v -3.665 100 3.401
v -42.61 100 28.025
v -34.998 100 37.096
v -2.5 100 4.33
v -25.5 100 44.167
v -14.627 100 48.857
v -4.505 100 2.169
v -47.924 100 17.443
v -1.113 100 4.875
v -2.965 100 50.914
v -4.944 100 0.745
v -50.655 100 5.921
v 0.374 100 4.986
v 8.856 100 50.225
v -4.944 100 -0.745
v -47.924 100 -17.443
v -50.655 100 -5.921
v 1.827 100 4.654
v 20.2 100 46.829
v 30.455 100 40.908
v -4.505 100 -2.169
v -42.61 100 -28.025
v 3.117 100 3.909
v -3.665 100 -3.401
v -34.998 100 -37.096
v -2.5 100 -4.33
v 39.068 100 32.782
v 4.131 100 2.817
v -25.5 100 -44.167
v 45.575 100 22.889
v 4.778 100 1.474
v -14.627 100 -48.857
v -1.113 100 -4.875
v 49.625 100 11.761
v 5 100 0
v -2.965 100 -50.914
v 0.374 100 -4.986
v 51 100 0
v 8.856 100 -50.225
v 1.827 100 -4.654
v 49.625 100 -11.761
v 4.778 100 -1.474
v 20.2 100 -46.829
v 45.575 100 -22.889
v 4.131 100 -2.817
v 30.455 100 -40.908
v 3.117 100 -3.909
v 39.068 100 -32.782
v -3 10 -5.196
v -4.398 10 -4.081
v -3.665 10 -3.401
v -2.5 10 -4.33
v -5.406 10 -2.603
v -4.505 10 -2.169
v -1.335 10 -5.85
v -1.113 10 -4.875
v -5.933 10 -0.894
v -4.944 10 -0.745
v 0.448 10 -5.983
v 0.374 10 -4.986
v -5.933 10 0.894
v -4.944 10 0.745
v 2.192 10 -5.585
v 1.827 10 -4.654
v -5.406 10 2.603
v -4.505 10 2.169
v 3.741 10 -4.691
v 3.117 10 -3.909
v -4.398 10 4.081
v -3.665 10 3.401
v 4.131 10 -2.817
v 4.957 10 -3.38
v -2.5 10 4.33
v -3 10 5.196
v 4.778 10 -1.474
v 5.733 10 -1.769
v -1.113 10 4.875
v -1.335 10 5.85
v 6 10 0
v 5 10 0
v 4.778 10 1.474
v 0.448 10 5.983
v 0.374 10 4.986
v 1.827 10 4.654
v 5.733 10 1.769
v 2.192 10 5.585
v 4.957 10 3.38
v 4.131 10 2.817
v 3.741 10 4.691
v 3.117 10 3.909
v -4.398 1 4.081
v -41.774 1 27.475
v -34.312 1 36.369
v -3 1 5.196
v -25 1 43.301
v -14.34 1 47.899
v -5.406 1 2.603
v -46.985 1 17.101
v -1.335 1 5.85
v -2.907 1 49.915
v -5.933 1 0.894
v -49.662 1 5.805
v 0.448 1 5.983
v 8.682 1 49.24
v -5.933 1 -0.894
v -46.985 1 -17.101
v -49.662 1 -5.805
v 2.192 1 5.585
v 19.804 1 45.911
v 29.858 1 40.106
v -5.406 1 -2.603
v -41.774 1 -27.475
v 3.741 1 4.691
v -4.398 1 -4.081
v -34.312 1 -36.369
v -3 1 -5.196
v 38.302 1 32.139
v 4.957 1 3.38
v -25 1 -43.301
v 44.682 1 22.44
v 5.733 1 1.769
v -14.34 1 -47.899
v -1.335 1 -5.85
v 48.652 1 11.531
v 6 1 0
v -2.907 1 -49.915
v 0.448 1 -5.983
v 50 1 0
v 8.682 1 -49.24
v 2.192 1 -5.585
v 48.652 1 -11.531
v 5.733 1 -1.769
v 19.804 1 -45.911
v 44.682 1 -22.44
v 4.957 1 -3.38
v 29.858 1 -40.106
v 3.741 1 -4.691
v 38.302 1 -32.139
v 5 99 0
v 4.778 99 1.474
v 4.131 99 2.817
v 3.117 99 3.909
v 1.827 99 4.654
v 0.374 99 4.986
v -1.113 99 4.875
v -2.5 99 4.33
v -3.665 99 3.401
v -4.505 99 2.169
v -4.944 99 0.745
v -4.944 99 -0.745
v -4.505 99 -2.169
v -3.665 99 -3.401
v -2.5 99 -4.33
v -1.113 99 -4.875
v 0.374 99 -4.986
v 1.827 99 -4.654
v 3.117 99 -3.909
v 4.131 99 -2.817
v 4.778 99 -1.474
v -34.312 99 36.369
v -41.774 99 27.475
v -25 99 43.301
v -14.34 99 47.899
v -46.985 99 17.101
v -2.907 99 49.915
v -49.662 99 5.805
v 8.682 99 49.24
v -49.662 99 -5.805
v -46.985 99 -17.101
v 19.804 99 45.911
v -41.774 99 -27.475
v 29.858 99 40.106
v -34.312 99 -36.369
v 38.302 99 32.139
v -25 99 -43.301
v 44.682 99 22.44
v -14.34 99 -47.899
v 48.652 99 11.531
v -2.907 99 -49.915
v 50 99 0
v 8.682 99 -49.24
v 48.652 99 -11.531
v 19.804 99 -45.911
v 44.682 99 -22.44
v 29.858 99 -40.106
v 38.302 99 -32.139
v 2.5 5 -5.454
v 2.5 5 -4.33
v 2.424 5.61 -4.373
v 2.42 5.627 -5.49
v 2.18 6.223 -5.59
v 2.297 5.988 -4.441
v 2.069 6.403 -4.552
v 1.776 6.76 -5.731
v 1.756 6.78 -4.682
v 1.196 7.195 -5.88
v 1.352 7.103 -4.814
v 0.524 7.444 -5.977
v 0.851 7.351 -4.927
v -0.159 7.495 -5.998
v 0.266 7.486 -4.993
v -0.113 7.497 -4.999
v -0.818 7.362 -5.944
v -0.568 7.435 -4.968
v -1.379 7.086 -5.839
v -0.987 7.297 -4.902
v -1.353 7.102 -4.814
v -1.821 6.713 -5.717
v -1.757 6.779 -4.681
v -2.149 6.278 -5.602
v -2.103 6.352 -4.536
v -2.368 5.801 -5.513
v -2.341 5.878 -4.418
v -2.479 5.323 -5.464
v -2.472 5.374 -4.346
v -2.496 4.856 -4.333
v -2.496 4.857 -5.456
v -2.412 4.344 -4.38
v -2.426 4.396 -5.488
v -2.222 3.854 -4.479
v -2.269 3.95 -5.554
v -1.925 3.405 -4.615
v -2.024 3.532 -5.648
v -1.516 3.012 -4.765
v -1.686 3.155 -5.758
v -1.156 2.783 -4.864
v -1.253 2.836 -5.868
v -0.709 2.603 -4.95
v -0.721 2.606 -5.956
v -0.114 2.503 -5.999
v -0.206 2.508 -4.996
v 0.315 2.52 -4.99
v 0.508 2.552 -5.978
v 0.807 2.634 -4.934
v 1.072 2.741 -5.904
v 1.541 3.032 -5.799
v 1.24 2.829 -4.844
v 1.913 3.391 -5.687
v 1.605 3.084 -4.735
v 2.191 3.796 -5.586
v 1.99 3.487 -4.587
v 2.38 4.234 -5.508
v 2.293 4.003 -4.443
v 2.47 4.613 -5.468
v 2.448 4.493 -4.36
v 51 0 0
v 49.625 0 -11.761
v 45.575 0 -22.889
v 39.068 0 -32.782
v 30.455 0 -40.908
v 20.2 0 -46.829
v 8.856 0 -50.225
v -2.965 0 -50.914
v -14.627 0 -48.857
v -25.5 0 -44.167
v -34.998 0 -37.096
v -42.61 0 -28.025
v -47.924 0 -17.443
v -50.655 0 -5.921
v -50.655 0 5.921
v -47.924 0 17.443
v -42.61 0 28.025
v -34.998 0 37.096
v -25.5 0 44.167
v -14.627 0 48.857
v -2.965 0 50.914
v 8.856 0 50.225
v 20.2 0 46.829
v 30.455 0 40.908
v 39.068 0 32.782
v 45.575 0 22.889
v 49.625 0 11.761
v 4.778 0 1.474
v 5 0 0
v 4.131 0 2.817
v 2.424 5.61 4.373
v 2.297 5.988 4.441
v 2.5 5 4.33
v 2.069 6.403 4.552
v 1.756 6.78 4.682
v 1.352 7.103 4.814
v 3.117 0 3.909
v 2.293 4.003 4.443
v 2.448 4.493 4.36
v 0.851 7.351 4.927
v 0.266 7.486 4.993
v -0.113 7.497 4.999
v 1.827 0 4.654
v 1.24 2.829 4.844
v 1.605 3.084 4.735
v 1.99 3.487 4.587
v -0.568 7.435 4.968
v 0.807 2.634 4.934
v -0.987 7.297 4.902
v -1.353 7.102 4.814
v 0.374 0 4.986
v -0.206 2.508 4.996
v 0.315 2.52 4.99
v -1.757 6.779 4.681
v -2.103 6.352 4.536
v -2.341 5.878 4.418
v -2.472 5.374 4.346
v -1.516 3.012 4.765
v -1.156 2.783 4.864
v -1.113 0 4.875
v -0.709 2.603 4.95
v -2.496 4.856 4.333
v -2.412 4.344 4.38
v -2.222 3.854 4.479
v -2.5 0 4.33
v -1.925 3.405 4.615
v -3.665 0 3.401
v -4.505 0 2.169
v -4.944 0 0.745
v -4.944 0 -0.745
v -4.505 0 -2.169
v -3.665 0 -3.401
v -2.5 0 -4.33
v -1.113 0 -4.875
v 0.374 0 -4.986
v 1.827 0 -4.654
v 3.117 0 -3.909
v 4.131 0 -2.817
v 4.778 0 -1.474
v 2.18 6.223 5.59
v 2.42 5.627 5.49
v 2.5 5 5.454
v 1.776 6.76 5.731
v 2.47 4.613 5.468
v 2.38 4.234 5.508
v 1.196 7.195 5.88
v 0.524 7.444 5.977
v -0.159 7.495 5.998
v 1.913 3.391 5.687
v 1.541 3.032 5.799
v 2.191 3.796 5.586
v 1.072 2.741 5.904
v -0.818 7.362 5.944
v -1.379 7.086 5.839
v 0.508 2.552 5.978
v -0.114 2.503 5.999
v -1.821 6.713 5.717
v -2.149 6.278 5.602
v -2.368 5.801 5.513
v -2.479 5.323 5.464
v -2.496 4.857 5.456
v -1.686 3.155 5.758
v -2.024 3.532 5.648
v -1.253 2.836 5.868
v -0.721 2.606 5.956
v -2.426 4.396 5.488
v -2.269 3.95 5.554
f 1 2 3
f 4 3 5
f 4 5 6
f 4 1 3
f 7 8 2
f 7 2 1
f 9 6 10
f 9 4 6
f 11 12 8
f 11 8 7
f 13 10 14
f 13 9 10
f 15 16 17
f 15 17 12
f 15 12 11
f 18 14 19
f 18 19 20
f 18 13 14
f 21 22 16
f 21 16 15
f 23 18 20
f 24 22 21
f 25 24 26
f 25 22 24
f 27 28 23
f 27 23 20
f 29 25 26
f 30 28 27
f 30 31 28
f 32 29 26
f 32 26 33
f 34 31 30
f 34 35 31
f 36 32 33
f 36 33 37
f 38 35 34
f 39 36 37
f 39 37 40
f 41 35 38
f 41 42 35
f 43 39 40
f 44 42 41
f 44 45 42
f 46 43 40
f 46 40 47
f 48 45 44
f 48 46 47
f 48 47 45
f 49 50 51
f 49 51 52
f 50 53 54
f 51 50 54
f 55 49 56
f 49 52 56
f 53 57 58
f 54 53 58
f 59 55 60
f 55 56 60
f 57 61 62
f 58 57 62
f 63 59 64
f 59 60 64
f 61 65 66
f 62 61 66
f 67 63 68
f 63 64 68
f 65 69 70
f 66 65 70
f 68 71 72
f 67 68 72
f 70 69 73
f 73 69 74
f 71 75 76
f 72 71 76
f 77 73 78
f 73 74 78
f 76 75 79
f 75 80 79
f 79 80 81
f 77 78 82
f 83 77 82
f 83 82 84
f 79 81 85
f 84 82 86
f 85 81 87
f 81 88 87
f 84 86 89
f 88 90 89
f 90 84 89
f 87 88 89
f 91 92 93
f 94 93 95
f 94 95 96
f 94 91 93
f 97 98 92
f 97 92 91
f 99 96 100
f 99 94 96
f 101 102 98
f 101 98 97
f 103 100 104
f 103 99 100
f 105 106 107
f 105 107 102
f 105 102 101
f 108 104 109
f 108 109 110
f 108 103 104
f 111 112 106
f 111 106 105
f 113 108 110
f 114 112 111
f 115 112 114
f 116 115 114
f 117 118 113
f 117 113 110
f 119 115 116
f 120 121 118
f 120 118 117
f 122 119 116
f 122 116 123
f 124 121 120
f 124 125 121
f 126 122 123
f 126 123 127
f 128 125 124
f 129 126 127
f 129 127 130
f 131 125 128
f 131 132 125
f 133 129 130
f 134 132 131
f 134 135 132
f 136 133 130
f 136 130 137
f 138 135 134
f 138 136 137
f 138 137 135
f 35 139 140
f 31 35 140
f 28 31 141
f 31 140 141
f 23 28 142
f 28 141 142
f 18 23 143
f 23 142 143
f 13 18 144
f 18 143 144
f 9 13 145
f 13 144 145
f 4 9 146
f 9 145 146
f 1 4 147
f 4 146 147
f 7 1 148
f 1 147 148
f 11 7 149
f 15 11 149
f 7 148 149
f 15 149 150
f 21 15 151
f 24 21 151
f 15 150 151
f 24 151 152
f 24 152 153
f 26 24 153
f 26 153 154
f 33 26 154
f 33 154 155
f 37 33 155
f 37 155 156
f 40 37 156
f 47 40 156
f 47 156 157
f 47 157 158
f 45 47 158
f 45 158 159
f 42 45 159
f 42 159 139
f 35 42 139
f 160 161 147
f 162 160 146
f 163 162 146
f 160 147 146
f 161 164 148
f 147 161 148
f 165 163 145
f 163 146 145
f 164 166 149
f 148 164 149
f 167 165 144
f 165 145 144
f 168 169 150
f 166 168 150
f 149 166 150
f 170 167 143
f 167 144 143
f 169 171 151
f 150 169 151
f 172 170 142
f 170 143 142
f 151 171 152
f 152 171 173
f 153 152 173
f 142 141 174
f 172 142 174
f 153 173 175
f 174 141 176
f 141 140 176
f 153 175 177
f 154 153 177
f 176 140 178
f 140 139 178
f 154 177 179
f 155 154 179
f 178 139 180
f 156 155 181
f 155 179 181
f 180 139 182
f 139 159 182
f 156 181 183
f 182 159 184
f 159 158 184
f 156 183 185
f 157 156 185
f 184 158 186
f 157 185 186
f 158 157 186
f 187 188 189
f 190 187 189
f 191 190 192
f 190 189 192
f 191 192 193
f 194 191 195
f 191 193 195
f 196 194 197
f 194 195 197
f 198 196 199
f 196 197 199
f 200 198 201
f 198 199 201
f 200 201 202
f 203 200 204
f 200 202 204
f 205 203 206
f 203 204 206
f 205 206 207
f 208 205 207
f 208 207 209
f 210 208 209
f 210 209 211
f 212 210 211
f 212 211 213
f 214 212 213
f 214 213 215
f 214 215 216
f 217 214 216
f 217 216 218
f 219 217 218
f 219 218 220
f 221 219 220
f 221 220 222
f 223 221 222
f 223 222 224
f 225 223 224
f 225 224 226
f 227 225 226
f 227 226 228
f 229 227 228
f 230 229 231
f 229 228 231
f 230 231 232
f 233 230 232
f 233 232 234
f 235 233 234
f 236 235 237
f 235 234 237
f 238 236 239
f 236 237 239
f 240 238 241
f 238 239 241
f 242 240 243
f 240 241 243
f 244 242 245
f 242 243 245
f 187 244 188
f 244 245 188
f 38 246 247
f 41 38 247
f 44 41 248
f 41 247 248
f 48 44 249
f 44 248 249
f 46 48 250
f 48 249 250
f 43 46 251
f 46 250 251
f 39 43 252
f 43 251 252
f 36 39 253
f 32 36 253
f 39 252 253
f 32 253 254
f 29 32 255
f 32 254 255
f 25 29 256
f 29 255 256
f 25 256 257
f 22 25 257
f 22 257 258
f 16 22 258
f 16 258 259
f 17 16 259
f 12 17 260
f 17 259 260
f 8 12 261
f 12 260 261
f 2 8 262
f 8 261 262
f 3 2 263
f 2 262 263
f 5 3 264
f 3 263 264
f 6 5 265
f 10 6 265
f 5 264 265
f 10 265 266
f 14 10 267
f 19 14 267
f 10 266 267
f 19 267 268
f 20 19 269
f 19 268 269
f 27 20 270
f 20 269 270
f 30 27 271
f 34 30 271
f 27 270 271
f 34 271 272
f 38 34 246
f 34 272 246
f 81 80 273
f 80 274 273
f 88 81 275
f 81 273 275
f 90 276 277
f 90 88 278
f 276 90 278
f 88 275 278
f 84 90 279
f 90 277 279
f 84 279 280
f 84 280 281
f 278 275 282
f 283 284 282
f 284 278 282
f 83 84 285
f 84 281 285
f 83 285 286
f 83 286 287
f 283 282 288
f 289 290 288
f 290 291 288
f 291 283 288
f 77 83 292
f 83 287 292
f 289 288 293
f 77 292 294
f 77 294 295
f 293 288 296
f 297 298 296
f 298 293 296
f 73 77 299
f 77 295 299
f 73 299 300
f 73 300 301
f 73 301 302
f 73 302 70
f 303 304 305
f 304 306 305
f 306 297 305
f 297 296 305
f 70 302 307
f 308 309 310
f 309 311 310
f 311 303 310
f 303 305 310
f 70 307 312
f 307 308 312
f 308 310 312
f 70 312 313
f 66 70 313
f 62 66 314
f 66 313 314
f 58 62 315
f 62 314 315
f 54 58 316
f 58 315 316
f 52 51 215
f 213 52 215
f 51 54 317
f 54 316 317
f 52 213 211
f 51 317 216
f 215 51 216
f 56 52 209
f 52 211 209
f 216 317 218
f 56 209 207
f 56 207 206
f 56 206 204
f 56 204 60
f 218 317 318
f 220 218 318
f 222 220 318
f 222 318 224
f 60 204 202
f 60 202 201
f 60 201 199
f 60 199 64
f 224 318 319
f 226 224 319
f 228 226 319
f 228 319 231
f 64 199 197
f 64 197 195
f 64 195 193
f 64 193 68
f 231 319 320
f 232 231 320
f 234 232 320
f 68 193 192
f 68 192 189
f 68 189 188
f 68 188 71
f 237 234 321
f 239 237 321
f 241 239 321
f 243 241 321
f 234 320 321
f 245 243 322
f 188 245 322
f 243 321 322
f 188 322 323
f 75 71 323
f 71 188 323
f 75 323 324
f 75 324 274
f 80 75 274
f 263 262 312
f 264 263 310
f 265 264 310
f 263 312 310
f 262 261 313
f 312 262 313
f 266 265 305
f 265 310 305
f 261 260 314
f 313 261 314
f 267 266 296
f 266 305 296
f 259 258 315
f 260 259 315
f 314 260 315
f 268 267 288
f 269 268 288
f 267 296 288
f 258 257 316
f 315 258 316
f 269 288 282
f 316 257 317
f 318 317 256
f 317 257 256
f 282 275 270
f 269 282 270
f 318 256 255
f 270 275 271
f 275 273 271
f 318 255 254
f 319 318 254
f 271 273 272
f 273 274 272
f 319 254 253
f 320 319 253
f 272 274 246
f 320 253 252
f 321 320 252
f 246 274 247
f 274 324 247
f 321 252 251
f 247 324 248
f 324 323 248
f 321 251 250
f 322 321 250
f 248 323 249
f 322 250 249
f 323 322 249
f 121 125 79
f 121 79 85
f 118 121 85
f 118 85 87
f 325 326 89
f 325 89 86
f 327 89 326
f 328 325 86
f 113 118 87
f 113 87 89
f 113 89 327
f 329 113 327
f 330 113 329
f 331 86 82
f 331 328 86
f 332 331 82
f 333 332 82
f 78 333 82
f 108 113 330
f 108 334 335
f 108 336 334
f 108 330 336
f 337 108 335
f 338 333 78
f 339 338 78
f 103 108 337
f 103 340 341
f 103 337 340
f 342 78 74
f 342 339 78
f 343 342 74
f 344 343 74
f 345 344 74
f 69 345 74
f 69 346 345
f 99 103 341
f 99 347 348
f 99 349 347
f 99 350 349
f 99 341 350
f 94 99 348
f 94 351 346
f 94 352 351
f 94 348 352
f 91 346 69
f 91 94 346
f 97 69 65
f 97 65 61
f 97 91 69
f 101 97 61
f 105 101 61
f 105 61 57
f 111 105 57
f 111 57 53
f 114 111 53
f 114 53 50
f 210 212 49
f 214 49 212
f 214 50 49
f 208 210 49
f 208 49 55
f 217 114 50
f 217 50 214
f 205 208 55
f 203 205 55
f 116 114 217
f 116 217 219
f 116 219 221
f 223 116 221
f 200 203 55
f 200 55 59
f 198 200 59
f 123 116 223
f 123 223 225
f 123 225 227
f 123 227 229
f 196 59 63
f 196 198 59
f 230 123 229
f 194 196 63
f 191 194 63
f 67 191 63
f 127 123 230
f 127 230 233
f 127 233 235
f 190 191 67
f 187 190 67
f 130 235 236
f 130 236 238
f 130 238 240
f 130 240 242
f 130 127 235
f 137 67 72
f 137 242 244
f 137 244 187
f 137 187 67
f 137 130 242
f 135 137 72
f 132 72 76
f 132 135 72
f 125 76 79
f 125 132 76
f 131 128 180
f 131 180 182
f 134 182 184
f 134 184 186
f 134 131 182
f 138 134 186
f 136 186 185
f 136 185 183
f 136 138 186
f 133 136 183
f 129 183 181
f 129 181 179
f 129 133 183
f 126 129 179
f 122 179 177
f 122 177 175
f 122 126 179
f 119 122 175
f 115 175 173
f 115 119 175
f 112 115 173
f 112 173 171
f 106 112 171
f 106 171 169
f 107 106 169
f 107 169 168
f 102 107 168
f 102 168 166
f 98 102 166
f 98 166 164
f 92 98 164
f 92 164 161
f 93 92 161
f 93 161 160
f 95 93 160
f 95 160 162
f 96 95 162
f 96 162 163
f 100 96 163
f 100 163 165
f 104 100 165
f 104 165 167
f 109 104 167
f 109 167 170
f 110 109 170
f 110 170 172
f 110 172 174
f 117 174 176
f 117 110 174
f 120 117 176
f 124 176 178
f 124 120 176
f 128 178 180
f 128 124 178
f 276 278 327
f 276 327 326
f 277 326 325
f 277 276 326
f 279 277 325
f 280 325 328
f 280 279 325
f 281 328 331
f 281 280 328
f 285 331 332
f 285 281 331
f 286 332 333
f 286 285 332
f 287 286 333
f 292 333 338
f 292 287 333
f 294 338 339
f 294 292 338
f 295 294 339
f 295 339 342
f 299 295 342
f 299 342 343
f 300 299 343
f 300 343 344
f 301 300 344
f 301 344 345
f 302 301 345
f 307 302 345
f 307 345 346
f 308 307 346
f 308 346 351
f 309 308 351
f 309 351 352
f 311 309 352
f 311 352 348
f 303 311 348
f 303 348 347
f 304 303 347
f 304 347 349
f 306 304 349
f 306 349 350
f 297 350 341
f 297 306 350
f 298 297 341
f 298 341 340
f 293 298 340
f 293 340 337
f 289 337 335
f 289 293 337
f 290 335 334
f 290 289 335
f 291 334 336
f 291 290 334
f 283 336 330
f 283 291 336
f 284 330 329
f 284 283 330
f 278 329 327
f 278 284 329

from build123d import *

# Parameters (mm, degrees)
SKETCH1_R               = 51
SKETCH1_R_2             = 50
EXTRUDE_THIN1_DEPTH     = 100
SKETCH1_2_R             = 50
BOSS_EXTRUDE1_DEPTH     = 1
LPATTERN1_COUNT         = 2
LPATTERN1_PITCH         = 99
SKETCH3_R               = 5
CUT_EXTRUDE1_DEPTH      = 124.296390864
SKETCH3_2_R             = 6
SKETCH3_2_R_2           = 5
EXTRUDE_THIN2_DEPTH     = 10
CUT_EXTRUDE2_DEPTH      = 20
CUT_EXTRUDE2_DEPTH_BACK = 20
SKETCH5_R               = 2.5


with BuildPart() as part:
    # Sketch1 → Extrude-Thin1 (new body)
    with BuildSketch(Plane(origin=(0, 0, 0), x_dir=(1, 0, 0), z_dir=(0, 1, 0))):
        Circle(SKETCH1_R)
        Circle(SKETCH1_R_2, mode=Mode.SUBTRACT)
    extrude(amount=EXTRUDE_THIN1_DEPTH)

    # Sketch1<2> → Boss-Extrude1 (add)
    with BuildSketch(Plane(origin=(0, 0, 0), x_dir=(1, 0, 0), z_dir=(0, 1, 0))):
        Circle(SKETCH1_2_R)
    boss_extrude1 = extrude(amount=BOSS_EXTRUDE1_DEPTH)

    # LPattern1: Boss-Extrude1 ×2
    with Locations(*[(0, i * LPATTERN1_PITCH, 0) for i in range(1, LPATTERN1_COUNT)]):
        add(boss_extrude1)

    # Sketch3 → Cut-Extrude1 (cut, through all)
    with BuildSketch(Plane.XZ):
        Circle(SKETCH3_R)
    extrude(amount=-CUT_EXTRUDE1_DEPTH, mode=Mode.SUBTRACT)

    # Sketch3<2> → Extrude-Thin2 (add)
    with BuildSketch(Plane.XZ):
        Circle(SKETCH3_2_R)
        Circle(SKETCH3_2_R_2, mode=Mode.SUBTRACT)
    extrude(amount=-EXTRUDE_THIN2_DEPTH)

    # Sketch5 → Cut-Extrude2 (cut, two sides: drawn at the far end of the back side and taken through both)
    with BuildSketch(Plane.XY.offset(-CUT_EXTRUDE2_DEPTH_BACK)):
        with Locations((0, 5)):
            Circle(SKETCH5_R)
    extrude(amount=CUT_EXTRUDE2_DEPTH + CUT_EXTRUDE2_DEPTH_BACK, mode=Mode.SUBTRACT)


solid = part.part
